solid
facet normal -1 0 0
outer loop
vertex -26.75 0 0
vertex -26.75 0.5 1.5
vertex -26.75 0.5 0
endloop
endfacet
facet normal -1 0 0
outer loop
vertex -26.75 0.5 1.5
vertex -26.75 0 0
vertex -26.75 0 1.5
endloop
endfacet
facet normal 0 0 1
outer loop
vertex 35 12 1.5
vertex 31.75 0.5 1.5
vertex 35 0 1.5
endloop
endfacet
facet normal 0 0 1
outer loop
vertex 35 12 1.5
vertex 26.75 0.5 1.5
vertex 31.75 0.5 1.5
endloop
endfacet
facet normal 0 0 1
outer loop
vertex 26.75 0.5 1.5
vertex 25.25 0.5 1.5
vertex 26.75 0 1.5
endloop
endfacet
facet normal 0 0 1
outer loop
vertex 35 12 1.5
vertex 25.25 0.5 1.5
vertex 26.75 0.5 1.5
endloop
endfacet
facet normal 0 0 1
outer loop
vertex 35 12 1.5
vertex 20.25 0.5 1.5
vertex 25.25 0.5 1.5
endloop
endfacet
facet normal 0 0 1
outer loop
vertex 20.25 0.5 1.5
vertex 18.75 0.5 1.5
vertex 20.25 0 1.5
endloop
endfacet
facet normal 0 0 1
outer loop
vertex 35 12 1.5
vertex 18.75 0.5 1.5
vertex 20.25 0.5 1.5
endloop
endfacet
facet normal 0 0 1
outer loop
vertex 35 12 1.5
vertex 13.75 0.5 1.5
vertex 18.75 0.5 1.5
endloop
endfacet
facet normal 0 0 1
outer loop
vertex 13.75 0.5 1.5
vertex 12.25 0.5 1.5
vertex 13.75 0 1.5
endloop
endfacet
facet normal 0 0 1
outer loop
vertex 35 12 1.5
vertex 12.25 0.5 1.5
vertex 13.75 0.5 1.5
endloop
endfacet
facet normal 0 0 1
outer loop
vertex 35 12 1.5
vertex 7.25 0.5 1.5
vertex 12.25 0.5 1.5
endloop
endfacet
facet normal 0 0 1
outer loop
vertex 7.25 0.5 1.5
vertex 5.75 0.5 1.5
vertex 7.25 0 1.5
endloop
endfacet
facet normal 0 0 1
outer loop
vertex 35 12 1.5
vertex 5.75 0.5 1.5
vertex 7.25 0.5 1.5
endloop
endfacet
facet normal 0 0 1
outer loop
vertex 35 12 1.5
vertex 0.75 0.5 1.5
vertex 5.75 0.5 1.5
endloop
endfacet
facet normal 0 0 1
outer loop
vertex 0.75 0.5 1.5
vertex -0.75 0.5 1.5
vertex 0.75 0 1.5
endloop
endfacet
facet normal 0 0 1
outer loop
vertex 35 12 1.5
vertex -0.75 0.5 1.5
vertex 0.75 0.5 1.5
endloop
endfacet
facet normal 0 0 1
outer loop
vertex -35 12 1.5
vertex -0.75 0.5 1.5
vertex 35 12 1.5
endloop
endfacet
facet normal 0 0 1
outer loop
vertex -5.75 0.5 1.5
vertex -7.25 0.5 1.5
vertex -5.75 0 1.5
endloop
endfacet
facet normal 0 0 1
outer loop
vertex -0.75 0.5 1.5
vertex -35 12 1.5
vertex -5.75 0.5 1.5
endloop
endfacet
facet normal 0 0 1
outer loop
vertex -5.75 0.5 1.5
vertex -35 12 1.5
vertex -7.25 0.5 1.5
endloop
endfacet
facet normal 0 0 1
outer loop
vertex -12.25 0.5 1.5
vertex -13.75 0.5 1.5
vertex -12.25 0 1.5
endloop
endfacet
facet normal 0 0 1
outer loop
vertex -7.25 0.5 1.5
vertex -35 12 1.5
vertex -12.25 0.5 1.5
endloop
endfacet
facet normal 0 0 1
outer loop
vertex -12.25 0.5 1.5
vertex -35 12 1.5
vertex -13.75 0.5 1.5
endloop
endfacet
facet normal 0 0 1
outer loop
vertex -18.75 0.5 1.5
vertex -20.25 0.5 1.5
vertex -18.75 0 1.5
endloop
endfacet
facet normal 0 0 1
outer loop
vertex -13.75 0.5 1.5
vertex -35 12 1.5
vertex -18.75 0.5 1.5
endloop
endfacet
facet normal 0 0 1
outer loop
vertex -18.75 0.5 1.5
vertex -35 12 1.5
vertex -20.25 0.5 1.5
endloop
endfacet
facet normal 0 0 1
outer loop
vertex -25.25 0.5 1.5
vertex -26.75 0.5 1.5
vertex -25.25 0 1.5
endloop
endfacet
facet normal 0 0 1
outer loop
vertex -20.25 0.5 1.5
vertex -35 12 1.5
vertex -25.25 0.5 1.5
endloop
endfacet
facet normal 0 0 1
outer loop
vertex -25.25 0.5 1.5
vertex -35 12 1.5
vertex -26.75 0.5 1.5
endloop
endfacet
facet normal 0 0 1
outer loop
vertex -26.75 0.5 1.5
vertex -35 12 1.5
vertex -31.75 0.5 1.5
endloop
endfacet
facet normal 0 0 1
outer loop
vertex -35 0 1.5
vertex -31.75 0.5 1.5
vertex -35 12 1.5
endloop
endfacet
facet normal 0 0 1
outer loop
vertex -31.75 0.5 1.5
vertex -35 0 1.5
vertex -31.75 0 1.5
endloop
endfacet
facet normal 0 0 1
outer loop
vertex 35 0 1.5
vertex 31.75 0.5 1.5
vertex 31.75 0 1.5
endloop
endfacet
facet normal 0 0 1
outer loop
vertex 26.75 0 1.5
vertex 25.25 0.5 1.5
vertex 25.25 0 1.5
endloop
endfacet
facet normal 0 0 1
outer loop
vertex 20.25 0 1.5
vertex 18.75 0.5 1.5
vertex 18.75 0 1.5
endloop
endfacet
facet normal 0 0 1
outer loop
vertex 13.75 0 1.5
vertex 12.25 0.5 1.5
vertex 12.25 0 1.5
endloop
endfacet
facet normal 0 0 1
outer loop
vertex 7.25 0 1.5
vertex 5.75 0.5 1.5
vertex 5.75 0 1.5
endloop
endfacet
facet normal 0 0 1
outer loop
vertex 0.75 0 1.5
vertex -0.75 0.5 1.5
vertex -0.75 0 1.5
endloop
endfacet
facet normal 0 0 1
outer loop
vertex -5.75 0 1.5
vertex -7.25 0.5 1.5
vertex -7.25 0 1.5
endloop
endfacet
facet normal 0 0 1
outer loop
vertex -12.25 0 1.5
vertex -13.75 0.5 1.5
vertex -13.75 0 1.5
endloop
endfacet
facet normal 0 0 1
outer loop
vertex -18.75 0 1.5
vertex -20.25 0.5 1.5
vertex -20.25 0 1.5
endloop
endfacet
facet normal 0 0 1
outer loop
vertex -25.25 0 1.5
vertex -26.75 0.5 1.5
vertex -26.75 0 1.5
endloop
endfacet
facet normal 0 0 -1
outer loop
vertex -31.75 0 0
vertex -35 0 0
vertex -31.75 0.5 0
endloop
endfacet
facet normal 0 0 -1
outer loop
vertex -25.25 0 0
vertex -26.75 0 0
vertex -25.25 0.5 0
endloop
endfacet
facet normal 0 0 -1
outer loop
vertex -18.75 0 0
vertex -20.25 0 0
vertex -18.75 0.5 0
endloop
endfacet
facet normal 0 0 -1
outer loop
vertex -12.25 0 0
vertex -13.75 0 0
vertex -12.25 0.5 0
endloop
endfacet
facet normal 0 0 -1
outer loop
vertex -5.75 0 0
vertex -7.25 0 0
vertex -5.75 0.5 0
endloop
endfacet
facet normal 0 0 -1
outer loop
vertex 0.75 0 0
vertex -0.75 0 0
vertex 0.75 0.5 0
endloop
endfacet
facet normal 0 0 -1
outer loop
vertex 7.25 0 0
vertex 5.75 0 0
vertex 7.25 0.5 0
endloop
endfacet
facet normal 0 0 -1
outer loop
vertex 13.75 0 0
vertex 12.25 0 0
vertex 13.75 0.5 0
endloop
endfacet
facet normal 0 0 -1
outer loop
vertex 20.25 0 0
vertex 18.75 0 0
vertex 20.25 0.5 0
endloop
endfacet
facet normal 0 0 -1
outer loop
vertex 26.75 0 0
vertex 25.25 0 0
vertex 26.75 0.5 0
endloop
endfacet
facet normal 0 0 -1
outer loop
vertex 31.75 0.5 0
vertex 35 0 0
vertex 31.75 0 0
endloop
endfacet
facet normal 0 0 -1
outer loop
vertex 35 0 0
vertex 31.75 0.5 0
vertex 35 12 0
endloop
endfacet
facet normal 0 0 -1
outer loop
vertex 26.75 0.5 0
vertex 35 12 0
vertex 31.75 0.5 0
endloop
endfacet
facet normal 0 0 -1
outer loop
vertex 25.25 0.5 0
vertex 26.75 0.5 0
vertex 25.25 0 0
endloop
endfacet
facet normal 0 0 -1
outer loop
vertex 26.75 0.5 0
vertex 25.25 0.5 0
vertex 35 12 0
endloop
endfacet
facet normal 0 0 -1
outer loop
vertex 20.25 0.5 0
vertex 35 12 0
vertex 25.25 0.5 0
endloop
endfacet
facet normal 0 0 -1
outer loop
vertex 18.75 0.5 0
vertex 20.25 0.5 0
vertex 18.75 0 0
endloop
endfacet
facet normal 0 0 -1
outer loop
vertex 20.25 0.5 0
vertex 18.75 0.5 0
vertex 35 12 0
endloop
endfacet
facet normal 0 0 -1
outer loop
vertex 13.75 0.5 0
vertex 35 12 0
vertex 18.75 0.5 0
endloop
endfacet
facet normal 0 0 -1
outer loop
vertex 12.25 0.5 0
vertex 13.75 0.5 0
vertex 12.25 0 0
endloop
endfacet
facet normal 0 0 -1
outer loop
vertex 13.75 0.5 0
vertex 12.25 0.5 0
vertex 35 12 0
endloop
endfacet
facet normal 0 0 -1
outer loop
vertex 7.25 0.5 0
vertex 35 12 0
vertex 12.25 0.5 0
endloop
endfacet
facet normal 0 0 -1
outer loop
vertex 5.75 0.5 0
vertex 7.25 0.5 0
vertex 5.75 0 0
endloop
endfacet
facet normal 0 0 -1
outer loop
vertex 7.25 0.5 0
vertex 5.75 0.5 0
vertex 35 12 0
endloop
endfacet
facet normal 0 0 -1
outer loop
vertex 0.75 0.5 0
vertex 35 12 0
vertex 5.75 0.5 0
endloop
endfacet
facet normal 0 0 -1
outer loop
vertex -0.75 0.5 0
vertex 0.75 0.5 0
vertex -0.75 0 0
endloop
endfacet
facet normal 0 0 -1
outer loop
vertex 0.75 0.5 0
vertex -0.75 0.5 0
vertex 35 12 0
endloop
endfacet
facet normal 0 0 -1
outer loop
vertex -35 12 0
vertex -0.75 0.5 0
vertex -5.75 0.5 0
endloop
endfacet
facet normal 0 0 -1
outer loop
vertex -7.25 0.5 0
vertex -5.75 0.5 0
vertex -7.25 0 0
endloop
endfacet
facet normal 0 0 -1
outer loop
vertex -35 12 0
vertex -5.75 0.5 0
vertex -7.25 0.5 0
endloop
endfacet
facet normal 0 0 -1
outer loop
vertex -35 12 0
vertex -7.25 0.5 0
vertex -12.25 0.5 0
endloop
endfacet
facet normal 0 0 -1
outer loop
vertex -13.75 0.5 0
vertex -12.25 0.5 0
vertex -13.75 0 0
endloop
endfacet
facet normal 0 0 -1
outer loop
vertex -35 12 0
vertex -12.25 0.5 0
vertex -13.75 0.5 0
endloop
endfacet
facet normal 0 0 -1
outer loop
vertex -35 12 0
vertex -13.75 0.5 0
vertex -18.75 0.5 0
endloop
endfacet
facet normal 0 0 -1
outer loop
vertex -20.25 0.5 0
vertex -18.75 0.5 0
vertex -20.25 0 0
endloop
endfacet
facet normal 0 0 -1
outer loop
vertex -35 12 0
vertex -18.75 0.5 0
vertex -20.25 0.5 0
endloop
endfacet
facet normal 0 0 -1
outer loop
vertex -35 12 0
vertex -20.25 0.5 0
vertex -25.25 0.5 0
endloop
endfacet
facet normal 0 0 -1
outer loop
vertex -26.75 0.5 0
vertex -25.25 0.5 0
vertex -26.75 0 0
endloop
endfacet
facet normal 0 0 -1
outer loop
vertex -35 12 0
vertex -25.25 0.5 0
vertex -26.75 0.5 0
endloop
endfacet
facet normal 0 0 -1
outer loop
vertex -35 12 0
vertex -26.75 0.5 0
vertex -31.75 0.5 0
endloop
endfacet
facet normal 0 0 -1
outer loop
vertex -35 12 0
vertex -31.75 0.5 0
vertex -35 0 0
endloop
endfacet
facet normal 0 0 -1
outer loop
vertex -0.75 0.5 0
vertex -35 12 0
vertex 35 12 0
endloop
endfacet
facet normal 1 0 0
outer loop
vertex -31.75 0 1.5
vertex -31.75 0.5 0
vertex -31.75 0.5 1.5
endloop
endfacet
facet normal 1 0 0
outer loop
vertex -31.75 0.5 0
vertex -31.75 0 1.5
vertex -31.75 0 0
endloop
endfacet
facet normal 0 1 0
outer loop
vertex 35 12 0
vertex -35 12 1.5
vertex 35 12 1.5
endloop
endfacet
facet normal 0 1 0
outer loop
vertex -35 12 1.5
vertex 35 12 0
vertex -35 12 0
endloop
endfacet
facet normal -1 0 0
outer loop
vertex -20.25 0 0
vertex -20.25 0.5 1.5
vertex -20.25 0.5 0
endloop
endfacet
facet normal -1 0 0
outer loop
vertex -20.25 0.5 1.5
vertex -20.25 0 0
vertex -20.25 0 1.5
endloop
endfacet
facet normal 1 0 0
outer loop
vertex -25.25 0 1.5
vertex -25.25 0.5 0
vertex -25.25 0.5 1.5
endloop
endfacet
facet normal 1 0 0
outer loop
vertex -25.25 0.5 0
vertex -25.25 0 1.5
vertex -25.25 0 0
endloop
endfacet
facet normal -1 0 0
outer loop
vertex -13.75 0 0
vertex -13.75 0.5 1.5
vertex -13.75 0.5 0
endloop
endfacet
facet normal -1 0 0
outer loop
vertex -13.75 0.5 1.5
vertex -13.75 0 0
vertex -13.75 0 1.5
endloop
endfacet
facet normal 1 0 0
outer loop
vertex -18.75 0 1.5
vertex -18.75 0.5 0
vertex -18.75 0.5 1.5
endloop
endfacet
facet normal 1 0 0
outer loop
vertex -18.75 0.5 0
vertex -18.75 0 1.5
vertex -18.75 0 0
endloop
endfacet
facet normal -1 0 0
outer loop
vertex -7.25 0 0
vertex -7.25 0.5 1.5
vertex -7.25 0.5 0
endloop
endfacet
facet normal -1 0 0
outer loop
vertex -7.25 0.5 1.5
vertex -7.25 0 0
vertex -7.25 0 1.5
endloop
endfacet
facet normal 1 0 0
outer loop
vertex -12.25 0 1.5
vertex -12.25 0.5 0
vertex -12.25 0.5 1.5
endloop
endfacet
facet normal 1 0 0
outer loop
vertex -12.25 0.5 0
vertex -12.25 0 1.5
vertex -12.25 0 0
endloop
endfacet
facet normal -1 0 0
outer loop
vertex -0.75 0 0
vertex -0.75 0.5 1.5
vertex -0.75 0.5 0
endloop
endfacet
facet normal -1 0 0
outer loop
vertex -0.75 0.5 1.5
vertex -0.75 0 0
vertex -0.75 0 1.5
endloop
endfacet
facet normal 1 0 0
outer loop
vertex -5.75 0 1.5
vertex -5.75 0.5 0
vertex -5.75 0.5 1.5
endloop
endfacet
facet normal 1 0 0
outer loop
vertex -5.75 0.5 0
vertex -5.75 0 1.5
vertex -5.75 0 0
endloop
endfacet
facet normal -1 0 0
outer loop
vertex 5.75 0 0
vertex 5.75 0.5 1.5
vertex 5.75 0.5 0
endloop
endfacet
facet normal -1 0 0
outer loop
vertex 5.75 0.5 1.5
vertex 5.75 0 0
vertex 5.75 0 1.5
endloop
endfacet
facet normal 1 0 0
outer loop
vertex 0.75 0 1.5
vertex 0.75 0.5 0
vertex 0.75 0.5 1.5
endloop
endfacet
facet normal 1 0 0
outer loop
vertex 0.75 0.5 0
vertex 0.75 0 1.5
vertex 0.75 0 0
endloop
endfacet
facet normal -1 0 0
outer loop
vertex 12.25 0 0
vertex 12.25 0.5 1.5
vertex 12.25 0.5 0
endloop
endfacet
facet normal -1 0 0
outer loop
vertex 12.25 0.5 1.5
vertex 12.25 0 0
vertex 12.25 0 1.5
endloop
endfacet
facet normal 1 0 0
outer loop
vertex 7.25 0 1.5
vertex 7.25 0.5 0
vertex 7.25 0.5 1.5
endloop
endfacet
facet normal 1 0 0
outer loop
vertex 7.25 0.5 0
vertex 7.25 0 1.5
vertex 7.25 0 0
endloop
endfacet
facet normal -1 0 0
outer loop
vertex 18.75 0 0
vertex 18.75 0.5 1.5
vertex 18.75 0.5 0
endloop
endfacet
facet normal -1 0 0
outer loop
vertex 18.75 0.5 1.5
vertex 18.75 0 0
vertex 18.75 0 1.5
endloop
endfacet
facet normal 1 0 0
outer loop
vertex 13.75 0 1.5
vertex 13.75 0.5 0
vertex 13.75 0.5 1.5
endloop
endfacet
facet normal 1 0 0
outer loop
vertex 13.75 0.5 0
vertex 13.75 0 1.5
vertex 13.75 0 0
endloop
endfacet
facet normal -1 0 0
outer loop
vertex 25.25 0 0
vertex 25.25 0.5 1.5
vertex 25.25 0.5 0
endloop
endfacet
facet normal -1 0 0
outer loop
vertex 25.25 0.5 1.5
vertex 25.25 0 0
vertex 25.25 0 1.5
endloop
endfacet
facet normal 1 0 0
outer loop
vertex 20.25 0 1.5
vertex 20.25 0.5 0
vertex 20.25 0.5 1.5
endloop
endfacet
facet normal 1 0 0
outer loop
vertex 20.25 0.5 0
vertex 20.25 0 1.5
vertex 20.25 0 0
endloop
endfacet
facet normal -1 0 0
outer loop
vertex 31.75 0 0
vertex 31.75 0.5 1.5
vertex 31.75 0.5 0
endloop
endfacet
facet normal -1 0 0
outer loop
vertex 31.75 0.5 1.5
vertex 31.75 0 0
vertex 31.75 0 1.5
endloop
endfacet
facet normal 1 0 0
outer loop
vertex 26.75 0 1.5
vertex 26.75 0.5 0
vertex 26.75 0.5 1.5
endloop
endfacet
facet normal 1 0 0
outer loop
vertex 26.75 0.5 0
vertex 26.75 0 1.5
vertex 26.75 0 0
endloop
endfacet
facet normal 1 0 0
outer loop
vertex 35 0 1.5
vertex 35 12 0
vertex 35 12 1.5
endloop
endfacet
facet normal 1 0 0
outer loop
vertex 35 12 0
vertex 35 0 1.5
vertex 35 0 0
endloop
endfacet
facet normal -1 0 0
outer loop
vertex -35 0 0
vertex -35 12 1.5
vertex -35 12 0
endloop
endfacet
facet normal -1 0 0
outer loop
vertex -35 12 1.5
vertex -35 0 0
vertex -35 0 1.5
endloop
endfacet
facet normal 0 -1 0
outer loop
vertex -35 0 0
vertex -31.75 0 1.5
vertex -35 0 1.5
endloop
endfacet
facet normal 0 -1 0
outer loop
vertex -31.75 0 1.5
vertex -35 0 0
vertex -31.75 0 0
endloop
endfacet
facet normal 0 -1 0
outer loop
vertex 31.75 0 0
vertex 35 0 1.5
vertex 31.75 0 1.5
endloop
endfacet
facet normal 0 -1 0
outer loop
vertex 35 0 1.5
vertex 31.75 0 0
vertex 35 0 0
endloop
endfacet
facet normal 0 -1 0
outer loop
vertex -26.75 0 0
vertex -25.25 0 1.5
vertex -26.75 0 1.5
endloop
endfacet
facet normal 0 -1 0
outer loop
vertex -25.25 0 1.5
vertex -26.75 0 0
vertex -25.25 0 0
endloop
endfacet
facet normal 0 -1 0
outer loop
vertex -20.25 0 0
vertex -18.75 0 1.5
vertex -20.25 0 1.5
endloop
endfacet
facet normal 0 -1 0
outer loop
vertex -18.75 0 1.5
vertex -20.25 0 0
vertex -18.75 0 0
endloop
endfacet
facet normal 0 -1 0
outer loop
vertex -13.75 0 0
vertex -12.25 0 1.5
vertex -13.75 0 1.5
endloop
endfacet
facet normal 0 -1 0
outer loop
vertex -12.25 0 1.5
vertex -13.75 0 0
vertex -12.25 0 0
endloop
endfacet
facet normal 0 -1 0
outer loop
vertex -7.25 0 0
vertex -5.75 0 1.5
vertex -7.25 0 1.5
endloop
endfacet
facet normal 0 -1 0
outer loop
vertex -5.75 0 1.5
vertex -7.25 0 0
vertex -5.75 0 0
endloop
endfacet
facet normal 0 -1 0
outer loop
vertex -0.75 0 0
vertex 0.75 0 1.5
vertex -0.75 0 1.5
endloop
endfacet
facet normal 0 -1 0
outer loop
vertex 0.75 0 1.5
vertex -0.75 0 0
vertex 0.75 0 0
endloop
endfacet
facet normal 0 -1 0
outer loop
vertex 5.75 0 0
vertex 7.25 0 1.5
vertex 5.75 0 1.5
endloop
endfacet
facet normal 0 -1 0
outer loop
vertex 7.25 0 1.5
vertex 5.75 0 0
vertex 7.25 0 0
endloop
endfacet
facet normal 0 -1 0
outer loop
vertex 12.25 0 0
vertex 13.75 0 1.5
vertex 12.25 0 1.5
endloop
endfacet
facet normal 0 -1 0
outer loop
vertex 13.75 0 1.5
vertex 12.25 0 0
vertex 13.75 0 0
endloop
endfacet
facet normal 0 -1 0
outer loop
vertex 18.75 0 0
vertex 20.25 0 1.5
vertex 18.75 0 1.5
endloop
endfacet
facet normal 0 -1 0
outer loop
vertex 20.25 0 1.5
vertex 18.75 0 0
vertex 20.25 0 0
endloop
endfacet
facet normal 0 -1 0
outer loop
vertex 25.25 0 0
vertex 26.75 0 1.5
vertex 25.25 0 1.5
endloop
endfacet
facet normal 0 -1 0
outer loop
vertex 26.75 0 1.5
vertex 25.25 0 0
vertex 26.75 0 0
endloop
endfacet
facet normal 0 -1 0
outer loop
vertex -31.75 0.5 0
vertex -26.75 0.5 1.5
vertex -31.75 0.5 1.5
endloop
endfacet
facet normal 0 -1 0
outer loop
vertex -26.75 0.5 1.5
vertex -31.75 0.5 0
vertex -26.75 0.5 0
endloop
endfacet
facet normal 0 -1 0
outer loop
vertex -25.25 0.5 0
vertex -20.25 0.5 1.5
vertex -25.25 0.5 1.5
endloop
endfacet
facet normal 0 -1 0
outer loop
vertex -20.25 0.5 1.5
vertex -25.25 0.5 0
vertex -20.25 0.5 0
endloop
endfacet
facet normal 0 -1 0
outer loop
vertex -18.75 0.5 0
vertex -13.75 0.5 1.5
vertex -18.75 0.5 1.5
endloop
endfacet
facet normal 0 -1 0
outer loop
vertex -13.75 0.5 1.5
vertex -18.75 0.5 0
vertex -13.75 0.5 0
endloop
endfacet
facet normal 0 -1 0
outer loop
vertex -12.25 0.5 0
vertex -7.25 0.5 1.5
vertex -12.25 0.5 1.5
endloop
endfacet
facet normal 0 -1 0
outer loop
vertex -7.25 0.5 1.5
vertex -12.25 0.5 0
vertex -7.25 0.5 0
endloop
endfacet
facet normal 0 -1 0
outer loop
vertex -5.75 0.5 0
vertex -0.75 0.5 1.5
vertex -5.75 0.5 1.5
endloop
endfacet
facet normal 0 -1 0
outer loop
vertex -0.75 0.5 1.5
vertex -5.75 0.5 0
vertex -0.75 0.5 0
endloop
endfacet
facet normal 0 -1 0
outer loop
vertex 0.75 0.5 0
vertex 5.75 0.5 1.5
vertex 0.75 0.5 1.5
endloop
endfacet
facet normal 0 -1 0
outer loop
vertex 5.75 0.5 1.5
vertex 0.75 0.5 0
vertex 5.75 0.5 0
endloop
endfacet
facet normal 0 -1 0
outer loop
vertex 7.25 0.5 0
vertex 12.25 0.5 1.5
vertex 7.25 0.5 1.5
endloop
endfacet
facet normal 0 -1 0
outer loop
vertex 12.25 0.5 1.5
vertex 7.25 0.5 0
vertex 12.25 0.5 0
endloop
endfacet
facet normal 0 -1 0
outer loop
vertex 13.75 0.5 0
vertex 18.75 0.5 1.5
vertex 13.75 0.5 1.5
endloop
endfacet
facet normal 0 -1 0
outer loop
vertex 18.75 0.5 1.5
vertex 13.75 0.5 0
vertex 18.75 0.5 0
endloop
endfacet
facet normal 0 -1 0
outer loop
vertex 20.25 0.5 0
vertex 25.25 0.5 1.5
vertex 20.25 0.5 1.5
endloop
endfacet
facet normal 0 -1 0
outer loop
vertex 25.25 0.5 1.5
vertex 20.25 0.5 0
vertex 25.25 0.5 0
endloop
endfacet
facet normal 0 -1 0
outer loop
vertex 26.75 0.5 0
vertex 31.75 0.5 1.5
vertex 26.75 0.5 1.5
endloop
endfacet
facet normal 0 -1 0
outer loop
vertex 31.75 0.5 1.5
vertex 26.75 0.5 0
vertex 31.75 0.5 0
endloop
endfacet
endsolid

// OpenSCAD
// 10-well comb for casting agarose gels
// Print orientation: flat on bed, teeth pointing down (-Y)

// ---- Parameters ----
plate_t      = 1.5;   // plate thickness (Z)
spine_l      = 70;    // spine length (X)
spine_w      = 12;    // spine width (Y)
tooth_n      = 10;    // number of teeth
tooth_w      = 5.0;   // tooth width (X)
tooth_l      = 12;    // tooth length (Y)
gap          = 1.5;   // gap between teeth (X)
eps          = 0.5;   // cutter overshoot past faces (Z)

$fn = 64;

// ---- Derived ----
pitch   = tooth_w + gap;              // centre-to-centre spacing
x_start = -(tooth_n - 1) * pitch / 2; // first tooth centre (row centred)

// ---- Model ----
difference() {
    union() {
        // Spine (back bar)
        translate([-spine_l / 2, 0, 0])
            cube([spine_l, spine_w, plate_t]);

        // Teeth
        for (i = [0 : tooth_n - 1])
            translate([x_start + i * pitch - tooth_w / 2,
                       -tooth_l,
                       0])
                cube([tooth_w, tooth_l + spine_w, plate_t]);
    }

    // Pockets for the wells (cut through the plate)
    for (i = [0 : tooth_n - 1])
        translate([x_start + i * pitch - tooth_w / 2,
                   -tooth_l - eps,
                   -eps])
            cube([tooth_w, tooth_l + 2 * eps, plate_t + 2 * eps]);
}
